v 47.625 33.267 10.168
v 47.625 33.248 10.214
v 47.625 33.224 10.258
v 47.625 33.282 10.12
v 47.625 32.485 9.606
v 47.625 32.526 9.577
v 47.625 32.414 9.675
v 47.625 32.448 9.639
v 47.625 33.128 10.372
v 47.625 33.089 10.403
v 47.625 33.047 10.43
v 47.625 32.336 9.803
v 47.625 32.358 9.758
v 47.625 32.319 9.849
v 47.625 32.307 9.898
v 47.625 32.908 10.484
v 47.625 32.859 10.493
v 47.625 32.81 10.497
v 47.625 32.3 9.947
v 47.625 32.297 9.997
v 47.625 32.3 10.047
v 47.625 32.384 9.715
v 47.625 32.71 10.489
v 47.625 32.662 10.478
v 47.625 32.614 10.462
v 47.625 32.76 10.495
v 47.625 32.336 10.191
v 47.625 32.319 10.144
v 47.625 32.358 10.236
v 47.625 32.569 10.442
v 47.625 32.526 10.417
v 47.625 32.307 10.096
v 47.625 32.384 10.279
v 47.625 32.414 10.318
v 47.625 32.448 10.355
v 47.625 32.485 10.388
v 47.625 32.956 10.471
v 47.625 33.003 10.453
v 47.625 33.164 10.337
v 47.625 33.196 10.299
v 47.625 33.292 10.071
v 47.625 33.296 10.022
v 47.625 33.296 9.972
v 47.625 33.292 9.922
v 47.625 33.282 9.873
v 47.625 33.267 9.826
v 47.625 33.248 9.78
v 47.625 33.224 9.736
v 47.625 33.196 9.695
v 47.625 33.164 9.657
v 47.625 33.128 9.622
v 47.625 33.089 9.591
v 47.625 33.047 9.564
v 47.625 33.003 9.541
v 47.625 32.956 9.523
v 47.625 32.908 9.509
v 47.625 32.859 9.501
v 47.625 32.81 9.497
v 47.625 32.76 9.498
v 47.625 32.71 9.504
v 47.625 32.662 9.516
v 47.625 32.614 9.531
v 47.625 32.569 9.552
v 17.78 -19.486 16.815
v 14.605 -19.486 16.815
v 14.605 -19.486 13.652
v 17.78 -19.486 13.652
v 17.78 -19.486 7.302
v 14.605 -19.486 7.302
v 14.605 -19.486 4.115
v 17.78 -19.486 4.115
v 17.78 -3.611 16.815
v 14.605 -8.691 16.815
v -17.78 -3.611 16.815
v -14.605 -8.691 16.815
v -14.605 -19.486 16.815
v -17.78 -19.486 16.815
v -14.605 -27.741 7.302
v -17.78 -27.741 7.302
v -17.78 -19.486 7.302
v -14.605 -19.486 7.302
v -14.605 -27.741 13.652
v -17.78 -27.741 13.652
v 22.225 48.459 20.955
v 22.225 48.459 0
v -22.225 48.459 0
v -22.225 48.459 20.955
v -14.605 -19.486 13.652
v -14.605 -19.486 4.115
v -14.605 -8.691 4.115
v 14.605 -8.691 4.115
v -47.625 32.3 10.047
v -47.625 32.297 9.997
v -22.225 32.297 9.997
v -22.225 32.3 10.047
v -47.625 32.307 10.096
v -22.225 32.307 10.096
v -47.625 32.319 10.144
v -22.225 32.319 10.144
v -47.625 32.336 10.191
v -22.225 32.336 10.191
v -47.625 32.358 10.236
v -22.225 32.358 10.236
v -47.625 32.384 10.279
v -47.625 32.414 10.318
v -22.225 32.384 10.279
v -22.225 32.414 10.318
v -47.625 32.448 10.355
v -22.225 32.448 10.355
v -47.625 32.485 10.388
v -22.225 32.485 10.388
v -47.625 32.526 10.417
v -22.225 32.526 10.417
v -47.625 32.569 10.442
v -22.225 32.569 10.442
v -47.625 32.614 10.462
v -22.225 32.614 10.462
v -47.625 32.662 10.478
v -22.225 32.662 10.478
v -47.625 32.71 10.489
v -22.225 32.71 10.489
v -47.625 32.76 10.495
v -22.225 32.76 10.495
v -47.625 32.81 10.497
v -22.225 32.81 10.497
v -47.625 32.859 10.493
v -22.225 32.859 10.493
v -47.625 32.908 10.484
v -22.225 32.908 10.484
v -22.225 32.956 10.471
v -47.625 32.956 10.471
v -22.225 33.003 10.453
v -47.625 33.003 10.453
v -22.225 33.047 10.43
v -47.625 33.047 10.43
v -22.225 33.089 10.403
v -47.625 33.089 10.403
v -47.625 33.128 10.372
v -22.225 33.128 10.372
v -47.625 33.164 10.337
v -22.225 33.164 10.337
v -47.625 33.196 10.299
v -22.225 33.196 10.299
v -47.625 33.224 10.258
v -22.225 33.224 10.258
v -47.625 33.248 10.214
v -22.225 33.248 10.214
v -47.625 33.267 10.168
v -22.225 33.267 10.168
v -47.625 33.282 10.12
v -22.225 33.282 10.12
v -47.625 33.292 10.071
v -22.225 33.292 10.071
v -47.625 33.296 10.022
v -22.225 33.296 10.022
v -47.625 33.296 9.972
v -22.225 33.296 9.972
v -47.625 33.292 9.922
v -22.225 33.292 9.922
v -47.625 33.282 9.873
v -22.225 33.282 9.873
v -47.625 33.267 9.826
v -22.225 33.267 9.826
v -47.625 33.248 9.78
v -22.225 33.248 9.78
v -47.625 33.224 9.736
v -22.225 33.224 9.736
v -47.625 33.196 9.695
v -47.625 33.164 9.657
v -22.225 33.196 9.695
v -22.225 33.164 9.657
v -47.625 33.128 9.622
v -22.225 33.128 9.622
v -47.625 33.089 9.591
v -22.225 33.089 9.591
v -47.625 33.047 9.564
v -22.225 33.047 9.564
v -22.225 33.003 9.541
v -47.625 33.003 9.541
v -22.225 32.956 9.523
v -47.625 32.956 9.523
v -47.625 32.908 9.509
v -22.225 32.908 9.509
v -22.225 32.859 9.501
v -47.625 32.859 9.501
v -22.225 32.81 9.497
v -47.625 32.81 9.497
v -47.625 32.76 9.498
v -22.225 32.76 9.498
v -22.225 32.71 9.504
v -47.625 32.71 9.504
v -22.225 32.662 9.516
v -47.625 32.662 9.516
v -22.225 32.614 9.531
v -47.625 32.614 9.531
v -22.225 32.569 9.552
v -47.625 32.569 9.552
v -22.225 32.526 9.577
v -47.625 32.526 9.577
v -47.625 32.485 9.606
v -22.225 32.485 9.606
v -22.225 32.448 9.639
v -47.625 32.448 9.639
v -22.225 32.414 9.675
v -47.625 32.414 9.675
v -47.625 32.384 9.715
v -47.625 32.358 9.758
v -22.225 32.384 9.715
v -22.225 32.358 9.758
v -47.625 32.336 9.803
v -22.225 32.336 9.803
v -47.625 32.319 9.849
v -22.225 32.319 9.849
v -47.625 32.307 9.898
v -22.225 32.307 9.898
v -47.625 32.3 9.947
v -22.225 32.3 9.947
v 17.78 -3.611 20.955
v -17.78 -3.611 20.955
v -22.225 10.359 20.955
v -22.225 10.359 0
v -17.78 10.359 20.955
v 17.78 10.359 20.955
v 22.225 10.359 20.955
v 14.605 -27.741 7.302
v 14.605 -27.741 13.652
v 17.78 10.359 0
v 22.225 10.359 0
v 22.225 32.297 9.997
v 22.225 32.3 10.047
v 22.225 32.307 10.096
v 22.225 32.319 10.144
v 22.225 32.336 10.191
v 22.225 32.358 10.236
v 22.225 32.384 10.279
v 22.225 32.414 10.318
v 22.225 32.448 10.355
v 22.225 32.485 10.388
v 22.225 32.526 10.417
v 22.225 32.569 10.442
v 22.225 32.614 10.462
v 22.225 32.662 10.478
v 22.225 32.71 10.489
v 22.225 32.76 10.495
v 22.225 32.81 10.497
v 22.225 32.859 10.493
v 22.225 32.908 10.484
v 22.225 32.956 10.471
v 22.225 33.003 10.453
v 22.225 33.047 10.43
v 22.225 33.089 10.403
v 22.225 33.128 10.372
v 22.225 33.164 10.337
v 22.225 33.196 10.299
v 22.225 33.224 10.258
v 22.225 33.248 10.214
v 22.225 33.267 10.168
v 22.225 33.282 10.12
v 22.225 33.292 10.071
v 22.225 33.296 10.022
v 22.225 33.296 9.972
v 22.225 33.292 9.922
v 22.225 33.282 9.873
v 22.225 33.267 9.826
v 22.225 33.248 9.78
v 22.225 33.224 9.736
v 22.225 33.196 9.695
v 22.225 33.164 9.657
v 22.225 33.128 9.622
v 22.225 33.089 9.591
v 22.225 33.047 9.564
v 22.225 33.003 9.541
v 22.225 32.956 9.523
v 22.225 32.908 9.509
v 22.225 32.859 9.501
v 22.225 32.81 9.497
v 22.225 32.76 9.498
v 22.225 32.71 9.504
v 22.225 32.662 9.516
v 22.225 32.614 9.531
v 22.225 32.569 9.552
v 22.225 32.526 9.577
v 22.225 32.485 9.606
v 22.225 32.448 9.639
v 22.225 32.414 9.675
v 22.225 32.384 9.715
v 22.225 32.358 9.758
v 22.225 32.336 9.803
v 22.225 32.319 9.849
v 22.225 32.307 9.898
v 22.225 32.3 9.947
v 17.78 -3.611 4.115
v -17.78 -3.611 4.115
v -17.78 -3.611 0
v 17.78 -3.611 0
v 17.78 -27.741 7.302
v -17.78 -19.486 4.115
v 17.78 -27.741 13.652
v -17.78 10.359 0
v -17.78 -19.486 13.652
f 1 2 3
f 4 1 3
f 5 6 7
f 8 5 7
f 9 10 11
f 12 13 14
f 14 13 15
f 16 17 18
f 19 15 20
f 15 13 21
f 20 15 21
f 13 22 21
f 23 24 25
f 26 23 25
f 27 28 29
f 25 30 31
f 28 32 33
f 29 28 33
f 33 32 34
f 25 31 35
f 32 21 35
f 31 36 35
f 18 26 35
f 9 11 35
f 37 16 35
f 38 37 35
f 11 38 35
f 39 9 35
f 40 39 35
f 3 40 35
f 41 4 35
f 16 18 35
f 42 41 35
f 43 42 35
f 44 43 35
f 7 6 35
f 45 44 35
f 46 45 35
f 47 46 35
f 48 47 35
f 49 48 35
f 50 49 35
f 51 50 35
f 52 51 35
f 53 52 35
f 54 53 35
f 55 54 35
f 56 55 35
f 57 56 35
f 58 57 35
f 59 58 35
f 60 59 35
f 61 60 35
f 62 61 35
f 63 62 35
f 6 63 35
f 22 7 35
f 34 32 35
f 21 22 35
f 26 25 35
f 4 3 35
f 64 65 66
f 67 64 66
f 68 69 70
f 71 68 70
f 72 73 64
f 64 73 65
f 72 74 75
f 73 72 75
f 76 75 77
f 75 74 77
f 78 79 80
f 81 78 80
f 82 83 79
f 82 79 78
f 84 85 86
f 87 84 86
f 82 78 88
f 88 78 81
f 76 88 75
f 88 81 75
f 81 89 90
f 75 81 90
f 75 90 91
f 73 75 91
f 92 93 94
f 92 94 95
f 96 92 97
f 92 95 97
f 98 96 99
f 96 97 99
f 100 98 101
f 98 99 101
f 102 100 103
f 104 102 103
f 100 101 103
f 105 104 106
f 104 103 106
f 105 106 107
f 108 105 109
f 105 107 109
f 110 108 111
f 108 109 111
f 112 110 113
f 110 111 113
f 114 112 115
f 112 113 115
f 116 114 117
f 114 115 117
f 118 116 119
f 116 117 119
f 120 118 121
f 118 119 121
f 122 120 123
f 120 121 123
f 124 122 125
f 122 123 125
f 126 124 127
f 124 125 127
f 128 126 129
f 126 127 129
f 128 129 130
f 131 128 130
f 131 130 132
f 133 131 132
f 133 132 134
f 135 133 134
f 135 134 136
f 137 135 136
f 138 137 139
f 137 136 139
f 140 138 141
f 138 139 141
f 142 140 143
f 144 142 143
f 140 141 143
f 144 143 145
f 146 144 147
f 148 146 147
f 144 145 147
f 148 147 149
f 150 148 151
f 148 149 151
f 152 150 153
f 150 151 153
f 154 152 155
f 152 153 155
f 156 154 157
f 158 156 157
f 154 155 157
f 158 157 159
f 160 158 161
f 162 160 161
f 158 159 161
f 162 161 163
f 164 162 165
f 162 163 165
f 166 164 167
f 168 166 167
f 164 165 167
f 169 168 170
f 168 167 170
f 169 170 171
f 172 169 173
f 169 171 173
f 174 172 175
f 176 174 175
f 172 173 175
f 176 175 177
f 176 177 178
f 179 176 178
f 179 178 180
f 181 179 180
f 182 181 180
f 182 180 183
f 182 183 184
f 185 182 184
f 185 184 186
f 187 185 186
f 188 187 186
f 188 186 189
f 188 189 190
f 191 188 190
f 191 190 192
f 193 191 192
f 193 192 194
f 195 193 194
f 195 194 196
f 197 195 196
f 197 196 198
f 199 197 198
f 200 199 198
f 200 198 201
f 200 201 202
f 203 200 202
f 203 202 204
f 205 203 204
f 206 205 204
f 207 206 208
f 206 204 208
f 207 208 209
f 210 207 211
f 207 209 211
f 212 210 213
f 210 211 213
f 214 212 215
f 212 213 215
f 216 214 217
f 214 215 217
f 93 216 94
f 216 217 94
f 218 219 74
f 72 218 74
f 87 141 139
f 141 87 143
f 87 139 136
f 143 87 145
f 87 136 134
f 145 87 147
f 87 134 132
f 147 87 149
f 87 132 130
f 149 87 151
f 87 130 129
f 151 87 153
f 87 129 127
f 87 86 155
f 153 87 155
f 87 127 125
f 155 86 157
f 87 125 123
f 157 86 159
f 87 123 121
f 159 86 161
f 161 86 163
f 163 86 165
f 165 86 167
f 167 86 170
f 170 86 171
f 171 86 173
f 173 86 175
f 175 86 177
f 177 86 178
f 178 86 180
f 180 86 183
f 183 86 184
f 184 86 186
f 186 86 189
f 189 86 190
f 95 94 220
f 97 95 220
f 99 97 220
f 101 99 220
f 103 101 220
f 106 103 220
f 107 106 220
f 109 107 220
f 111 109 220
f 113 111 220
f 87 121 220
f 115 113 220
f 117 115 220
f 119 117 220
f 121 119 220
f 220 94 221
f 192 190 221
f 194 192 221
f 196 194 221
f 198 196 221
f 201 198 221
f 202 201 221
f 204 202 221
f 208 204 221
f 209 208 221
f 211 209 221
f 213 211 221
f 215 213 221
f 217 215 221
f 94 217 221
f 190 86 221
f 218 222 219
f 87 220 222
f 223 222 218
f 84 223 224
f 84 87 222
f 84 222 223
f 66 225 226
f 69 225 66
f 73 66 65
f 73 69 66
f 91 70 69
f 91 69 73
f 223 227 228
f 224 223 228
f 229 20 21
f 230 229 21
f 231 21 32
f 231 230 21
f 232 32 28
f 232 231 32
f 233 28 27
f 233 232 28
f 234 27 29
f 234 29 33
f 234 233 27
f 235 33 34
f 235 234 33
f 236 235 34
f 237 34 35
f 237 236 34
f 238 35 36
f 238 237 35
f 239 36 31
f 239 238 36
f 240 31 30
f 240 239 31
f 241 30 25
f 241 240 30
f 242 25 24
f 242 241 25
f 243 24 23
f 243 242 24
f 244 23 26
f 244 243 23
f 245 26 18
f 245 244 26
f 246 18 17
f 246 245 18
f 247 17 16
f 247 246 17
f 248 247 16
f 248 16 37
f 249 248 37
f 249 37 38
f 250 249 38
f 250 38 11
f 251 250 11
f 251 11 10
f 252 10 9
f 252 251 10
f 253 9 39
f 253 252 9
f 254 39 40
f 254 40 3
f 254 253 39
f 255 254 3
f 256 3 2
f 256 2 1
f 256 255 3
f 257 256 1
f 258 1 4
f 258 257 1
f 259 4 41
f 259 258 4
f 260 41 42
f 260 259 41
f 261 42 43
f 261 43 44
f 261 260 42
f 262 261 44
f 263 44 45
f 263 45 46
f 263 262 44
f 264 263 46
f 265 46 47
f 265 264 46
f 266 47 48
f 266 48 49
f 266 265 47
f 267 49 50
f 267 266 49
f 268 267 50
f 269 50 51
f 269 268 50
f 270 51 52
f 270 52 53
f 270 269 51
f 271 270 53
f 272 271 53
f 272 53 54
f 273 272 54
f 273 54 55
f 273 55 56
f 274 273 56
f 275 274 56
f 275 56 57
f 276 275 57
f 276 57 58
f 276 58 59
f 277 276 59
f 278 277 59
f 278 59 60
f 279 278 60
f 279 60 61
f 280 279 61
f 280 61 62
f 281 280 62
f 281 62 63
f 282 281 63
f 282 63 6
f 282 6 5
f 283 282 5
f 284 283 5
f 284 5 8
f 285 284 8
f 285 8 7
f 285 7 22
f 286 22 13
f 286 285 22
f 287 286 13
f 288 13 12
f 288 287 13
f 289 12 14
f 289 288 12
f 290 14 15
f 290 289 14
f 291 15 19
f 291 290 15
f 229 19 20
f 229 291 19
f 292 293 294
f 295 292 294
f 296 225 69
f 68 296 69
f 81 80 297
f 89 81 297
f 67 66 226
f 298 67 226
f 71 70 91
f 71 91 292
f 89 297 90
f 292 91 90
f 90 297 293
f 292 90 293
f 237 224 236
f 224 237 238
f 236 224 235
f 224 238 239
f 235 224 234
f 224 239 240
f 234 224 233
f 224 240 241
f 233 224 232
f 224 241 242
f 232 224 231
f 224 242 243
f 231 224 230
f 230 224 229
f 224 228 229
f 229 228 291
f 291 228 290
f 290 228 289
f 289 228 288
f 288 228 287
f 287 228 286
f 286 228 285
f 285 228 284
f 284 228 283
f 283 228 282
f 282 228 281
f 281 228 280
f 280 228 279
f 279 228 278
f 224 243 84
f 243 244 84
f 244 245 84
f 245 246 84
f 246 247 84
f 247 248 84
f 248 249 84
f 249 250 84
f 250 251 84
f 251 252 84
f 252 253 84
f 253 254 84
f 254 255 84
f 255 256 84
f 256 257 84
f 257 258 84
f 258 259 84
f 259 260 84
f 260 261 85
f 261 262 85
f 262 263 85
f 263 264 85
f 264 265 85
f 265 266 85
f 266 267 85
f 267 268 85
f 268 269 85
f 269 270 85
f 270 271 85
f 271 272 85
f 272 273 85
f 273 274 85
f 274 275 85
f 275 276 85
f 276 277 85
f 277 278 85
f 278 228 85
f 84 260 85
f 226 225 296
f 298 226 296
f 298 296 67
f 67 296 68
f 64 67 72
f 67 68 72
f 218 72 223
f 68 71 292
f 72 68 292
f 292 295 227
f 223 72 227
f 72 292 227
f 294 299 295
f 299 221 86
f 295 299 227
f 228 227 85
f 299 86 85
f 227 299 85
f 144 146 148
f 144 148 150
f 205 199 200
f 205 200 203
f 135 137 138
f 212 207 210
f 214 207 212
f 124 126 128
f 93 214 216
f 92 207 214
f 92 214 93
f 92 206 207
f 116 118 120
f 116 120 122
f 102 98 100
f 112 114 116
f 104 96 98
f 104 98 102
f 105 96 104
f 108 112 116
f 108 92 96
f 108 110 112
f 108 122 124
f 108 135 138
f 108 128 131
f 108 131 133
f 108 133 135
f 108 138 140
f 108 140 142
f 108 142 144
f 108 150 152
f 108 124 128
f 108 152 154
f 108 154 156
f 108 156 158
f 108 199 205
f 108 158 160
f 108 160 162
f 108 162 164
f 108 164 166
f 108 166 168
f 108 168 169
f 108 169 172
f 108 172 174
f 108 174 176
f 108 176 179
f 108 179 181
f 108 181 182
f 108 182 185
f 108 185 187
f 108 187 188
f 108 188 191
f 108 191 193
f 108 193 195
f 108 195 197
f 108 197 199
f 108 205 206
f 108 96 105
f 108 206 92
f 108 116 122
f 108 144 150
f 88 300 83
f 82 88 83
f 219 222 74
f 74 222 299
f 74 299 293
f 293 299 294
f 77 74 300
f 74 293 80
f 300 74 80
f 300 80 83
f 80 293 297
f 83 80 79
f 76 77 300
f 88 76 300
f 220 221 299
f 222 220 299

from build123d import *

# Parameters (mm, degrees)
F0_W     = 3.175
F0_H     = 19.05
F1_DEPTH = 20.955
F3_DEPTH = 45.72
F4_R     = 0.5
F5_DEPTH = 25.4


with BuildPart() as f1:
    # F0 (on Top) → F1 (new body)
    with BuildSketch(Plane.XY):
        Polygon((22.225, 48.458836), (-22.225, 48.458836), (-22.225, 10.358836), (-17.78, 10.358836), (17.78, 10.358836), (22.225, 10.358836), align=None)
        Polygon((17.78, 10.358836), (-17.78, 10.358836), (-17.78, -8.691164), (-14.605, -8.691164), (14.605, -8.691164), (17.78, -8.691164), align=None)
        with Locations((-16.1925, -18.216164)):
            Rectangle(F0_W, F0_H)
        with Locations((16.1925, -18.216164)):
            Rectangle(F0_W, F0_H)
    extrude(amount=F1_DEPTH)

    # F2 (on face) → F3 (cut)
    with BuildSketch(Plane(origin=(-17.78, 0, 0), x_dir=(0, -1, 0), z_dir=(-1, 0, 0))):
        Polygon((19.486164, 13.6525), (27.741164, 13.6525), (27.741164, 20.955), (3.611164, 20.955), (3.611164, 16.8148), (19.486164, 16.8148), align=None)
        Polygon((27.741164, 0), (27.741164, 7.3025), (19.486164, 7.3025), (19.486164, 4.1148), (3.611164, 4.1148), (3.611164, 0), align=None)
    extrude(amount=-F3_DEPTH, mode=Mode.SUBTRACT)

    # F4 (on face) → F5 (join)
    with BuildSketch(Plane(origin=(-22.225, 0, 0), x_dir=(0, -1, 0), z_dir=(-1, 0, 0))):
        with Locations((-32.797098, 9.996843)):
            Circle(F4_R)
    extrude(amount=F5_DEPTH)

    # F6: F1 across plane


with BuildPart() as f1_1:
    add(f1.part)
    add(f1.part.mirror(Plane.YZ))


solid = f1_1.part
